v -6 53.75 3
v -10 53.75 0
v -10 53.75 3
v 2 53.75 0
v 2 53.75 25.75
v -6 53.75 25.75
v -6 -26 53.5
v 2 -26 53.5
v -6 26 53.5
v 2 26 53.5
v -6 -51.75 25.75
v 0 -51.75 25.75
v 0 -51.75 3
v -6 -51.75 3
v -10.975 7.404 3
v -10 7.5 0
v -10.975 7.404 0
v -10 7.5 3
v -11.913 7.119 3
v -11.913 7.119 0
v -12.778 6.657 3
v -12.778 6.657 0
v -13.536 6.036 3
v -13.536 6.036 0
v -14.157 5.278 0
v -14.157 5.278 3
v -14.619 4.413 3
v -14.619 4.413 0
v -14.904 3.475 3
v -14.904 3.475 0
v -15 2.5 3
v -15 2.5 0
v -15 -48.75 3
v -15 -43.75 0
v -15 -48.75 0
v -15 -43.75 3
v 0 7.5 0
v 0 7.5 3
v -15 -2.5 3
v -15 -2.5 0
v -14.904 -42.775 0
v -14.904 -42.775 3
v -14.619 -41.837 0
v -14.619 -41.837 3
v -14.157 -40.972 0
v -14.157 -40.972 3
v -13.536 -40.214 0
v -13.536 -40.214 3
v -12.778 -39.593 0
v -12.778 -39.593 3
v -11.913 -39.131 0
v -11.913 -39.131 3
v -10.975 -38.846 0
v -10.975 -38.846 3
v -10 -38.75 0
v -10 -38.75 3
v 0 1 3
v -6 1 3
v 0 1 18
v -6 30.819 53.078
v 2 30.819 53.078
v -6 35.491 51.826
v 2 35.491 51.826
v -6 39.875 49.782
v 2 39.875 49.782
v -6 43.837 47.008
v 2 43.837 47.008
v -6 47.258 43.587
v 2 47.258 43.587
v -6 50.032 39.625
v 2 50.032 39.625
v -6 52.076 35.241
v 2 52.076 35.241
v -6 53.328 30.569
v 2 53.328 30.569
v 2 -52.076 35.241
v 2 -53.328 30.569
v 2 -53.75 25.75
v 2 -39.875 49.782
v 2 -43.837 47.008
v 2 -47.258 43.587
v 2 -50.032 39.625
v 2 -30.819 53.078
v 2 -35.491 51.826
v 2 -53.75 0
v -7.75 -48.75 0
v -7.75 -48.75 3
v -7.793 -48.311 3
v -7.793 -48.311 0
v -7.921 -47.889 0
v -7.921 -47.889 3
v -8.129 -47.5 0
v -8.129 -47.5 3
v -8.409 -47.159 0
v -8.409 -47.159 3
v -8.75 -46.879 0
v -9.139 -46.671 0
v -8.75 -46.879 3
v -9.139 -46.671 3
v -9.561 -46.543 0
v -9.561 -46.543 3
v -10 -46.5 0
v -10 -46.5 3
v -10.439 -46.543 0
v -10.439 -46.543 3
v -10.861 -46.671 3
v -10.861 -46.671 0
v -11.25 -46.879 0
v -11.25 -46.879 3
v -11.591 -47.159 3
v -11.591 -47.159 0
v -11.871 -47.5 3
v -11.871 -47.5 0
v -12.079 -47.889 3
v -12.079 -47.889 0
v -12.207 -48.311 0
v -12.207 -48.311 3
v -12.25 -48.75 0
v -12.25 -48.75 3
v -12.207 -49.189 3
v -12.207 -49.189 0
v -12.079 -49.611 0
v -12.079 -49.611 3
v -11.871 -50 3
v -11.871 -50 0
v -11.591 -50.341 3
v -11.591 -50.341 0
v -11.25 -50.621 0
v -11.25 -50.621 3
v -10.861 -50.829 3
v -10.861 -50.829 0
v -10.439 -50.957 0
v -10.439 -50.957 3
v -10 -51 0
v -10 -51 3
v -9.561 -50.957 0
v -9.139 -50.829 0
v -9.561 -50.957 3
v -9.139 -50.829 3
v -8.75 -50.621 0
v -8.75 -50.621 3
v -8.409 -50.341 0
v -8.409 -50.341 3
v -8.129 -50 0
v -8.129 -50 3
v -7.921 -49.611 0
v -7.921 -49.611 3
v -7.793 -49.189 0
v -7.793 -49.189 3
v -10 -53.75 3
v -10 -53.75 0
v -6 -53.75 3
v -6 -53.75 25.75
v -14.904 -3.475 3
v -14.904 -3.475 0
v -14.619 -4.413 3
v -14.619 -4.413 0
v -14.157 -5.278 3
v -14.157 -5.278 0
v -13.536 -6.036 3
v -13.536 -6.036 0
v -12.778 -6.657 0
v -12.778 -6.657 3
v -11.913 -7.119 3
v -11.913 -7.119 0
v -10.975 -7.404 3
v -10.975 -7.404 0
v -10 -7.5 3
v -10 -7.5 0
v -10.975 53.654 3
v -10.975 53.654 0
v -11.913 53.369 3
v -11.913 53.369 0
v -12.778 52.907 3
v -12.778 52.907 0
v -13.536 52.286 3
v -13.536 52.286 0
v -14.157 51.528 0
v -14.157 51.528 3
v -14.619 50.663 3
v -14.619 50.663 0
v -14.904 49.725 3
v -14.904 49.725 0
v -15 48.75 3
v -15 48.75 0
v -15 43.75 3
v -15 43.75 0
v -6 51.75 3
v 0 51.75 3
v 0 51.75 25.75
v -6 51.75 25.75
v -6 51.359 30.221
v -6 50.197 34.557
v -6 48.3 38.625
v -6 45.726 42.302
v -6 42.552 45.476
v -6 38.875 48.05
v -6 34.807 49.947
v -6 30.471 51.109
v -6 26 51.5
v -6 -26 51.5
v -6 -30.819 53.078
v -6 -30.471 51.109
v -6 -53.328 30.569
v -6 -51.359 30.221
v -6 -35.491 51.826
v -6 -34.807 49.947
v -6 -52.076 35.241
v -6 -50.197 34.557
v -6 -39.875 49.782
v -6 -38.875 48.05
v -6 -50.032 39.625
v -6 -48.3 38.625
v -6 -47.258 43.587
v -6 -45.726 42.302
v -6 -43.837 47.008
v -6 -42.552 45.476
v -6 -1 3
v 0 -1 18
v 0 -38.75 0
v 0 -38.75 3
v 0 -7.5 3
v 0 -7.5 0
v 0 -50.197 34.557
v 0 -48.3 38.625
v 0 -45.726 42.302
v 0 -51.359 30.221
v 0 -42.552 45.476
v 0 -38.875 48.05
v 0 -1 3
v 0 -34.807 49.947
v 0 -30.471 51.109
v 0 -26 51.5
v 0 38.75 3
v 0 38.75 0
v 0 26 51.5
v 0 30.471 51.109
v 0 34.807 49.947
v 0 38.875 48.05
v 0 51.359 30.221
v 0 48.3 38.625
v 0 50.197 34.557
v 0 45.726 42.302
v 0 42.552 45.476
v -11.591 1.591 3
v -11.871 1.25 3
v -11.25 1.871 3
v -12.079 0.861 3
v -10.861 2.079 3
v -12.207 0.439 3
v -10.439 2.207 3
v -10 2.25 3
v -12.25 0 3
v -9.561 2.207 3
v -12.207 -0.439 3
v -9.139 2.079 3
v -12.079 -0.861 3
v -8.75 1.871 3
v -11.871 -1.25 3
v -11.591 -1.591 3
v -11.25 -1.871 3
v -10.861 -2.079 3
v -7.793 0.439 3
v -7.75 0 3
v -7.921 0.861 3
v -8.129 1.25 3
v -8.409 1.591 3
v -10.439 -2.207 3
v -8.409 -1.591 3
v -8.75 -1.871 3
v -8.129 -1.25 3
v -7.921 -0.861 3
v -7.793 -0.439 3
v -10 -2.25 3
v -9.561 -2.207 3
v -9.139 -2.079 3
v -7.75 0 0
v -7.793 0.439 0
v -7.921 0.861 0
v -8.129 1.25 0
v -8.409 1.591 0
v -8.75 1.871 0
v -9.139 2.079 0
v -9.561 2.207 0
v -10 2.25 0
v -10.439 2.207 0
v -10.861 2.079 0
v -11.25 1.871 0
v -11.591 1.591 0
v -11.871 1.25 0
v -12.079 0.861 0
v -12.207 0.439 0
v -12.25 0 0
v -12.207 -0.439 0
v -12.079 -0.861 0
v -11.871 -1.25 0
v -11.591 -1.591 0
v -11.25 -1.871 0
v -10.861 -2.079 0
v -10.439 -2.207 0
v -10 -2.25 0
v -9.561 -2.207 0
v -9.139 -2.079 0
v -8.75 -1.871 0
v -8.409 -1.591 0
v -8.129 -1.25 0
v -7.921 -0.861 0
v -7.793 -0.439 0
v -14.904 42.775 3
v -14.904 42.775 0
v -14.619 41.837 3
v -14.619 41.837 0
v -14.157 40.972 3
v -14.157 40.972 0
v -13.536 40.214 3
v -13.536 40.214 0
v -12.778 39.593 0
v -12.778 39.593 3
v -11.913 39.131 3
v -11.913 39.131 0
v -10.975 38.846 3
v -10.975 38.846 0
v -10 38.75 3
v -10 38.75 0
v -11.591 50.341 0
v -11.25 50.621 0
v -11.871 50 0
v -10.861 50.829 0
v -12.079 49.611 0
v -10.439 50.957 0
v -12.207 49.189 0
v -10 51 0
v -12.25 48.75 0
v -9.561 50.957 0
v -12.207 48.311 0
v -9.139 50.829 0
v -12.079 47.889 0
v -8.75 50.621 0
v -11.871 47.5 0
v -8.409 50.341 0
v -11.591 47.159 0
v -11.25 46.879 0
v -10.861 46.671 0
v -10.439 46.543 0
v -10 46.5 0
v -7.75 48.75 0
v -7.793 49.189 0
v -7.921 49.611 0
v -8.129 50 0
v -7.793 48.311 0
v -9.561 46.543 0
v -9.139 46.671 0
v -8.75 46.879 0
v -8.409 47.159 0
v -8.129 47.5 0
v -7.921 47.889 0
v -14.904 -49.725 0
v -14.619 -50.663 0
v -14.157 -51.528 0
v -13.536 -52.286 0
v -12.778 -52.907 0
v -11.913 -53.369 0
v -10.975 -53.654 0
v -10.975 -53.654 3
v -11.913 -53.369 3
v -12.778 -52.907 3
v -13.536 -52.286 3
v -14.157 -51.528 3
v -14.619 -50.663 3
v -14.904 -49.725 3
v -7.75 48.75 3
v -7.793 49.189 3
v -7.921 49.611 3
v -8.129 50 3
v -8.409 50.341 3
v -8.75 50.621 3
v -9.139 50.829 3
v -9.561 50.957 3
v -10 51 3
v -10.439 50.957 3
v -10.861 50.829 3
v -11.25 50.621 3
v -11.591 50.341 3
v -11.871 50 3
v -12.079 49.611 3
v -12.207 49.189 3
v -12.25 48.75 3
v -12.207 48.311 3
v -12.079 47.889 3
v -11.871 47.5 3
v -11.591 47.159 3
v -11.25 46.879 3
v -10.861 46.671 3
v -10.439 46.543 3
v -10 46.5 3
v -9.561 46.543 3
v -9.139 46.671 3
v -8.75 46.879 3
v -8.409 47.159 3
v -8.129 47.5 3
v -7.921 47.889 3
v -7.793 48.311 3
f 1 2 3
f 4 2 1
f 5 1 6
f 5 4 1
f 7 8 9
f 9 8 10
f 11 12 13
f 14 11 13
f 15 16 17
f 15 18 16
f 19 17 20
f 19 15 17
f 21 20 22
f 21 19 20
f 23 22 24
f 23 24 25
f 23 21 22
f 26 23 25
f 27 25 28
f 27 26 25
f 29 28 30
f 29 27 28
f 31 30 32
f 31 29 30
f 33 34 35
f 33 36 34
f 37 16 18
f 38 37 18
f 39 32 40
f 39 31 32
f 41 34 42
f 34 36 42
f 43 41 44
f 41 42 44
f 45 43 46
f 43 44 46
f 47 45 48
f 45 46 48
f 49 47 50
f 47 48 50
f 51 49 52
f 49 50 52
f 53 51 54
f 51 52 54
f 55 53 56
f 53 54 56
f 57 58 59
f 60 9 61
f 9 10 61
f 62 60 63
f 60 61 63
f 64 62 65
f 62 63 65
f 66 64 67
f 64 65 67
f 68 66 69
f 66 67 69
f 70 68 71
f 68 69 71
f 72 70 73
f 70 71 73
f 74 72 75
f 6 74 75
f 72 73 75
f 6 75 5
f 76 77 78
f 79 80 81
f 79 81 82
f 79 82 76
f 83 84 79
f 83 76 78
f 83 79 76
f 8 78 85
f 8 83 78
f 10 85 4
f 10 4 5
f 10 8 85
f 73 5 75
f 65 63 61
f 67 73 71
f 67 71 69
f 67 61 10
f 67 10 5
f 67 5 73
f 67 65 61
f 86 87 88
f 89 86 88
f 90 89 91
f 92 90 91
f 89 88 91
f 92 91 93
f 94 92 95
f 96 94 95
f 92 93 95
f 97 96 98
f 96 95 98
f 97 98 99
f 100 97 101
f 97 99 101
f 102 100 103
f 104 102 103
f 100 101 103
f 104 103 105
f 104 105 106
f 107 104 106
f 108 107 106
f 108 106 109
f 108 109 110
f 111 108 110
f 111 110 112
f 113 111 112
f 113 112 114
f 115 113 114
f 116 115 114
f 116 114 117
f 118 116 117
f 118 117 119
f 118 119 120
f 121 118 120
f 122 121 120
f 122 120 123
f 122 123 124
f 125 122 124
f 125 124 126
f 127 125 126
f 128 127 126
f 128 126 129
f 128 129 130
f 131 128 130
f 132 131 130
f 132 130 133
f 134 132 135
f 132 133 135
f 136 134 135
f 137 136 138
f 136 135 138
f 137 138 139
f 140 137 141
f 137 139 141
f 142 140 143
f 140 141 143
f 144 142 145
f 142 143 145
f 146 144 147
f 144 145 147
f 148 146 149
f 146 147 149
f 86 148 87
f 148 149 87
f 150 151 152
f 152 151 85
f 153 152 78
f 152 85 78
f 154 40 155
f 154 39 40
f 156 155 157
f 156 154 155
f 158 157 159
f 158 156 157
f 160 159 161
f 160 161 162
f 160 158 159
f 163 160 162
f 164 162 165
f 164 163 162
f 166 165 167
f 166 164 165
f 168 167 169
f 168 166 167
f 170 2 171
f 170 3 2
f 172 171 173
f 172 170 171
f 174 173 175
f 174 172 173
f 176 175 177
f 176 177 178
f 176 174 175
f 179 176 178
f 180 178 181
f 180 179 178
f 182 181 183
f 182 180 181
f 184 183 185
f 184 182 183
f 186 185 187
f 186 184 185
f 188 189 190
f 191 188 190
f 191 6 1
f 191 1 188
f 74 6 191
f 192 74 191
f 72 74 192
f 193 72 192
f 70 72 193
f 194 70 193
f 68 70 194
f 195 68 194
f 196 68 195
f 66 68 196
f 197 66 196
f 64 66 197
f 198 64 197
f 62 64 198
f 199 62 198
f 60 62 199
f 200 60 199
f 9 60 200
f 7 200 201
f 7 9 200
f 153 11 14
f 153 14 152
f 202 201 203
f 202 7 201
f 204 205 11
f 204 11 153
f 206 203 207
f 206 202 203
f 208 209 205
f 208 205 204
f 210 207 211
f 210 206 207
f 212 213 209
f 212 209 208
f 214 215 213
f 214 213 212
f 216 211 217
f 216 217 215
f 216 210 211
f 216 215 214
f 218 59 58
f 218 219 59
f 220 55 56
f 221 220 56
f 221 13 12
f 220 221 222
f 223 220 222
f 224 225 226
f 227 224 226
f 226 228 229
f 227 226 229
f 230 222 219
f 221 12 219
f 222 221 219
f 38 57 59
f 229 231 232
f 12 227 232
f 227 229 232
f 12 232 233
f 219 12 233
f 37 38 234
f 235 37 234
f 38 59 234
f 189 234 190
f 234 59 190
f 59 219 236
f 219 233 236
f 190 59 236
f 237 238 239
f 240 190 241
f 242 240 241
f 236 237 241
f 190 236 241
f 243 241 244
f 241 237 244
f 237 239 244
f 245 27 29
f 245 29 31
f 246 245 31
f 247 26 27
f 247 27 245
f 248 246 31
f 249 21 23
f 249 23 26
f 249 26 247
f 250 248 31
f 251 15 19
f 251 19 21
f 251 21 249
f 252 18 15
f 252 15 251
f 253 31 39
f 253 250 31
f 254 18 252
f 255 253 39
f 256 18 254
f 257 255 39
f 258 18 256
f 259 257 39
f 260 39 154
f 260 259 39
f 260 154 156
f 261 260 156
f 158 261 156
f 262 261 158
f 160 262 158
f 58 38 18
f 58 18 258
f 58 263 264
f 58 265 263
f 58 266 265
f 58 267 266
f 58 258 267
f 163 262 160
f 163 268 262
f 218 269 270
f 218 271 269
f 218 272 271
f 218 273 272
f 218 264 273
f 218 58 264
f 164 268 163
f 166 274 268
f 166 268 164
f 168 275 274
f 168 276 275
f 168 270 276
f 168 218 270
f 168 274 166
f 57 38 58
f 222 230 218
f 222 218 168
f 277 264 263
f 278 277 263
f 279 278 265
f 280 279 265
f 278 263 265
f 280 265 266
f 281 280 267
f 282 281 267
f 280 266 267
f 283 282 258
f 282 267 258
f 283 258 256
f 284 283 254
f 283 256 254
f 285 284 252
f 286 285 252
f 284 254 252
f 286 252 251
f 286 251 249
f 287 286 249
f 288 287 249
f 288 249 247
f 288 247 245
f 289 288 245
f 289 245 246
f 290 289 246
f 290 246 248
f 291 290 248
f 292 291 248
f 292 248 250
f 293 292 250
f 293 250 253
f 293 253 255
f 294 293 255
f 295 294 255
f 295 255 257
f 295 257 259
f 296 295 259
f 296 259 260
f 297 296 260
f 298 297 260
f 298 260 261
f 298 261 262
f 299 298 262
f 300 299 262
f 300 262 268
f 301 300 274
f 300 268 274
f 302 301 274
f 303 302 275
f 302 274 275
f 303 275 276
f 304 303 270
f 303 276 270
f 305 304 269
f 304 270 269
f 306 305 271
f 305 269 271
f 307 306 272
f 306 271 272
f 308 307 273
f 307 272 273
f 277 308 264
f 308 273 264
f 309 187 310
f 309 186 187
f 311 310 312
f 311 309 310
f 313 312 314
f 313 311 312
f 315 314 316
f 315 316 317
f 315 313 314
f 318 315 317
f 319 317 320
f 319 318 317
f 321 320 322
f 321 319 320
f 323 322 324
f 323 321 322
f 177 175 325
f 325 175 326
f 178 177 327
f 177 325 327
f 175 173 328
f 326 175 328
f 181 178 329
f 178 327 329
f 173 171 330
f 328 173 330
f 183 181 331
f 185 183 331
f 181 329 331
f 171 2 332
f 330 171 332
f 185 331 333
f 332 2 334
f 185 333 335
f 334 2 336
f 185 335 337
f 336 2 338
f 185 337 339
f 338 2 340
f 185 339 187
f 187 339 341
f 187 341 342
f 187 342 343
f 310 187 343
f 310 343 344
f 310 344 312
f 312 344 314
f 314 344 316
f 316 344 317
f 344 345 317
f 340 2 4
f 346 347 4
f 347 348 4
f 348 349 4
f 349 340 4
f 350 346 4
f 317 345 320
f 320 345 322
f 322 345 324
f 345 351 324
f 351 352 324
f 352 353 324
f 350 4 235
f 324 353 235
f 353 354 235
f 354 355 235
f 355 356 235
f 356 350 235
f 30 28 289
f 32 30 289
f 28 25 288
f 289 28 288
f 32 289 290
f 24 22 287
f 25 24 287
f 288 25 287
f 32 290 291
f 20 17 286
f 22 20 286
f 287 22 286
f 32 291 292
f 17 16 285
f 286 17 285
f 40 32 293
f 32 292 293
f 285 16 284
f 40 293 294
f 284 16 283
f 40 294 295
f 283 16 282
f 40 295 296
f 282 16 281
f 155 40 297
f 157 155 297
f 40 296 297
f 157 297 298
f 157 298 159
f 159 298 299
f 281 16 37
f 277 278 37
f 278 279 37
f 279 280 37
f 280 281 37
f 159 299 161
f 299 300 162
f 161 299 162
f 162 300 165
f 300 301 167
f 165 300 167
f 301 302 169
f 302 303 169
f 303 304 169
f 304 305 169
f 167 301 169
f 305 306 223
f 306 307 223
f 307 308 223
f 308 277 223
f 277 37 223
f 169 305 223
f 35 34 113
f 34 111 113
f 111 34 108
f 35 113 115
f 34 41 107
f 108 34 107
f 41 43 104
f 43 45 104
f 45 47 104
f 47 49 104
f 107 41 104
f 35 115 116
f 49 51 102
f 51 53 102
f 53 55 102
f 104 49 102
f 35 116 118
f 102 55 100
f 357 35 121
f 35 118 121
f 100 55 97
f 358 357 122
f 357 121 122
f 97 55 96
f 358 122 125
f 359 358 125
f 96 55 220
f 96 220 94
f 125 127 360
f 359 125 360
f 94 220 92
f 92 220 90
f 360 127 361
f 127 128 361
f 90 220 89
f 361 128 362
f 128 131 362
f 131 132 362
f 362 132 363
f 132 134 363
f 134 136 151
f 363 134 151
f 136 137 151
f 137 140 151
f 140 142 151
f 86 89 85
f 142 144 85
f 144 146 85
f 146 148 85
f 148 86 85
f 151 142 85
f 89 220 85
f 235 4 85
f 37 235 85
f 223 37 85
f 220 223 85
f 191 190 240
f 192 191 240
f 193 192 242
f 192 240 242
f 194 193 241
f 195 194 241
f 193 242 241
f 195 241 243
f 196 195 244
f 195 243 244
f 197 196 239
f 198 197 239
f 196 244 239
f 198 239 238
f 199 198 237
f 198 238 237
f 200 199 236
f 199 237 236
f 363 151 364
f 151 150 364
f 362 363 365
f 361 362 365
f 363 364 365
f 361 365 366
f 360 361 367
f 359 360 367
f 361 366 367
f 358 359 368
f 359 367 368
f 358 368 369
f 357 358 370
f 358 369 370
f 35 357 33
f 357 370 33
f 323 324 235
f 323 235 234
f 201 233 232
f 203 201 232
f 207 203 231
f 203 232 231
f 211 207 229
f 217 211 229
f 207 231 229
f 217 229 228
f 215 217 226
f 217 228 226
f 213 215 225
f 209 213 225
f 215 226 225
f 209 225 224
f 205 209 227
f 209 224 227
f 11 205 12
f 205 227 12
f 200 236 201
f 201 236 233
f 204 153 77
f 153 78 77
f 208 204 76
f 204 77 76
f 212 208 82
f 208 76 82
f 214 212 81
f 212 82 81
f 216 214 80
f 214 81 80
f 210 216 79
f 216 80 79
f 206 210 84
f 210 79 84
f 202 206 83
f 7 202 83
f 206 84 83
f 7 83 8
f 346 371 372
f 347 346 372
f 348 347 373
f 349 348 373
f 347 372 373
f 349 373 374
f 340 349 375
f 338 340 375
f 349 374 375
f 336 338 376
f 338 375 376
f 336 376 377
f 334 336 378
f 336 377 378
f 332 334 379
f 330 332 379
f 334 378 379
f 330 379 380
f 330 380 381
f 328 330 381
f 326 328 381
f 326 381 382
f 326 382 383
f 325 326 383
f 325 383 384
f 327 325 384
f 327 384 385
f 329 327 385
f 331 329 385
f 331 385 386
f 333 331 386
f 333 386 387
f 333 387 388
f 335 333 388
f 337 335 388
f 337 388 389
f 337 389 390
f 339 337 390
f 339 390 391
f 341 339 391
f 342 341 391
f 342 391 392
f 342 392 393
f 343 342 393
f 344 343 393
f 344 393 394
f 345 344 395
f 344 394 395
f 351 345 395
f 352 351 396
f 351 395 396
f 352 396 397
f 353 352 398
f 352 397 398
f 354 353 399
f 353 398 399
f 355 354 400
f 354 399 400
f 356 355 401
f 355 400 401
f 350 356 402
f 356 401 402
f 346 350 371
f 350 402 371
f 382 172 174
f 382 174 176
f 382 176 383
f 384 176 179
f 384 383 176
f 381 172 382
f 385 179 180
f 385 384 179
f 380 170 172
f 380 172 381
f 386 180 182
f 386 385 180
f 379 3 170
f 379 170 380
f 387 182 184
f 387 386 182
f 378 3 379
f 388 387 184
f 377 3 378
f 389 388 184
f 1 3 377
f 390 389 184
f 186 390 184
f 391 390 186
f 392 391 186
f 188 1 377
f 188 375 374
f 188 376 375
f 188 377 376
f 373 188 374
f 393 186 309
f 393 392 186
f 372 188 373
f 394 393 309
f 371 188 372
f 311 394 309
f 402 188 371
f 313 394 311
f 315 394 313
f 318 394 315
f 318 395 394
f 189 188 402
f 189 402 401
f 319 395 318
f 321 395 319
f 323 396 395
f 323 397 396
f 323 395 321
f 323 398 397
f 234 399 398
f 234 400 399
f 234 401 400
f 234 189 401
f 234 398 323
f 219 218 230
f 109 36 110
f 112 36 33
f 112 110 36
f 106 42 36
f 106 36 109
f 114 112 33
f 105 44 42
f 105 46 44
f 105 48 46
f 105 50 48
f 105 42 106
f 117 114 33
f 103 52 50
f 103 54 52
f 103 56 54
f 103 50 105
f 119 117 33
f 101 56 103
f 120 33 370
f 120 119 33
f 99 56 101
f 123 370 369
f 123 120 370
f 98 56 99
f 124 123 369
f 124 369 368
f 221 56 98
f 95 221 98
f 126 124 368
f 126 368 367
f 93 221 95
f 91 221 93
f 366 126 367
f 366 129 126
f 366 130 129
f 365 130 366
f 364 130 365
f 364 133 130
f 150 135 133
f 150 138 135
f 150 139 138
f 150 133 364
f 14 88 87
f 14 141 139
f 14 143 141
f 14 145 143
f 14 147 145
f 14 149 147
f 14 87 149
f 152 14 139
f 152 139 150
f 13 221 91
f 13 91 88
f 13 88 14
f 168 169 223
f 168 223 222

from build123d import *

# Parameters (mm, degrees)
F1_DEPTH = 2
F3_DEPTH = 6
F4_W     = 15
F4_H     = 3
F5_DEPTH = 15
F7_DEPTH = 1
F8_R     = 2.25
F9_DEPTH = 3.001
F10_R    = 5


with BuildPart() as f1:
    # F0 (on Right) → F1 (new body)
    with BuildSketch(Plane.YZ):
        with BuildLine():
            Line((-53.75, 25.75), (-53.75, 0))
            Line((-53.75, 0), (53.75, 0))
            Line((53.75, 0), (53.75, 25.75))
            ThreePointArc((53.75, 25.75), (45.622213, 45.372213), (26, 53.5))
            Line((26, 53.5), (-26, 53.5))
            ThreePointArc((-26, 53.5), (-45.622213, 45.372213), (-53.75, 25.75))
        make_face()
    extrude(amount=F1_DEPTH)

    # F2 (on face) → F3 (join)
    with BuildSketch(Plane(origin=(0, 0, 0), x_dir=(0, -1, 0), z_dir=(-1, 0, 0))):
        with BuildLine():
            ThreePointArc((26, 51.5), (44.208, 43.958), (51.75, 25.75))
            Line((51.75, 25.75), (51.75, 0))
            Line((51.75, 0), (53.75, 0))
            Line((53.75, 0), (53.75, 25.75))
            ThreePointArc((53.75, 25.75), (45.622213, 45.372213), (26, 53.5))
            Line((26, 53.5), (-26, 53.5))
            ThreePointArc((-26, 53.5), (-45.622213, 45.372213), (-53.75, 25.75))
            Line((-53.75, 25.75), (-53.75, 0))
            Line((-53.75, 0), (-51.75, 0))
            Line((-51.75, 0), (-51.75, 25.75))
            ThreePointArc((-51.75, 25.75), (-44.208, 43.958), (-26, 51.5))
            Line((-26, 51.5), (26, 51.5))
        make_face()
    extrude(amount=F3_DEPTH)

    # F4 (on face) → F5 (join)
    with BuildSketch(Plane(origin=(0, 0, 0), x_dir=(0, -1, 0), z_dir=(-1, 0, 0))):
        with Locations((0, 1.5)):
            Rectangle(F4_W, F4_H)
        with Locations((-46.25, 1.5)):
            Rectangle(F4_W, F4_H)
        with Locations((46.25, 1.5)):
            Rectangle(F4_W, F4_H)
    extrude(amount=F5_DEPTH)

    # F6 (on Front) → F7 (join, symmetric)
    with BuildSketch(Plane.XZ):
        Polygon((0, 18), (-6, 3), (0, 3), align=None)
    extrude(amount=F7_DEPTH, both=True)

    # F8 (on face) → F9 (cut, through all)
    with BuildSketch(Plane.XY.offset(3)):
        with Locations((-10, 48.75)):
            Circle(F8_R)
        with Locations((-10, 0)):
            Circle(F8_R)
        with Locations((-10, -48.75)):
            Circle(F8_R)
    extrude(amount=-F9_DEPTH, mode=Mode.SUBTRACT)

    # F10
    f10_edges = [f1.edges().sort_by_distance(p)[0] for p in [
        (-15, -53.75, 1.5),
        (-15, 53.75, 1.5),
        (-15, 38.75, 1.5),
        (-15, 7.5, 1.5),
        (-15, -7.5, 1.5),
        (-15, -38.75, 1.5),
    ]]
    fillet(f10_edges, radius=F10_R)


solid = f1.part
